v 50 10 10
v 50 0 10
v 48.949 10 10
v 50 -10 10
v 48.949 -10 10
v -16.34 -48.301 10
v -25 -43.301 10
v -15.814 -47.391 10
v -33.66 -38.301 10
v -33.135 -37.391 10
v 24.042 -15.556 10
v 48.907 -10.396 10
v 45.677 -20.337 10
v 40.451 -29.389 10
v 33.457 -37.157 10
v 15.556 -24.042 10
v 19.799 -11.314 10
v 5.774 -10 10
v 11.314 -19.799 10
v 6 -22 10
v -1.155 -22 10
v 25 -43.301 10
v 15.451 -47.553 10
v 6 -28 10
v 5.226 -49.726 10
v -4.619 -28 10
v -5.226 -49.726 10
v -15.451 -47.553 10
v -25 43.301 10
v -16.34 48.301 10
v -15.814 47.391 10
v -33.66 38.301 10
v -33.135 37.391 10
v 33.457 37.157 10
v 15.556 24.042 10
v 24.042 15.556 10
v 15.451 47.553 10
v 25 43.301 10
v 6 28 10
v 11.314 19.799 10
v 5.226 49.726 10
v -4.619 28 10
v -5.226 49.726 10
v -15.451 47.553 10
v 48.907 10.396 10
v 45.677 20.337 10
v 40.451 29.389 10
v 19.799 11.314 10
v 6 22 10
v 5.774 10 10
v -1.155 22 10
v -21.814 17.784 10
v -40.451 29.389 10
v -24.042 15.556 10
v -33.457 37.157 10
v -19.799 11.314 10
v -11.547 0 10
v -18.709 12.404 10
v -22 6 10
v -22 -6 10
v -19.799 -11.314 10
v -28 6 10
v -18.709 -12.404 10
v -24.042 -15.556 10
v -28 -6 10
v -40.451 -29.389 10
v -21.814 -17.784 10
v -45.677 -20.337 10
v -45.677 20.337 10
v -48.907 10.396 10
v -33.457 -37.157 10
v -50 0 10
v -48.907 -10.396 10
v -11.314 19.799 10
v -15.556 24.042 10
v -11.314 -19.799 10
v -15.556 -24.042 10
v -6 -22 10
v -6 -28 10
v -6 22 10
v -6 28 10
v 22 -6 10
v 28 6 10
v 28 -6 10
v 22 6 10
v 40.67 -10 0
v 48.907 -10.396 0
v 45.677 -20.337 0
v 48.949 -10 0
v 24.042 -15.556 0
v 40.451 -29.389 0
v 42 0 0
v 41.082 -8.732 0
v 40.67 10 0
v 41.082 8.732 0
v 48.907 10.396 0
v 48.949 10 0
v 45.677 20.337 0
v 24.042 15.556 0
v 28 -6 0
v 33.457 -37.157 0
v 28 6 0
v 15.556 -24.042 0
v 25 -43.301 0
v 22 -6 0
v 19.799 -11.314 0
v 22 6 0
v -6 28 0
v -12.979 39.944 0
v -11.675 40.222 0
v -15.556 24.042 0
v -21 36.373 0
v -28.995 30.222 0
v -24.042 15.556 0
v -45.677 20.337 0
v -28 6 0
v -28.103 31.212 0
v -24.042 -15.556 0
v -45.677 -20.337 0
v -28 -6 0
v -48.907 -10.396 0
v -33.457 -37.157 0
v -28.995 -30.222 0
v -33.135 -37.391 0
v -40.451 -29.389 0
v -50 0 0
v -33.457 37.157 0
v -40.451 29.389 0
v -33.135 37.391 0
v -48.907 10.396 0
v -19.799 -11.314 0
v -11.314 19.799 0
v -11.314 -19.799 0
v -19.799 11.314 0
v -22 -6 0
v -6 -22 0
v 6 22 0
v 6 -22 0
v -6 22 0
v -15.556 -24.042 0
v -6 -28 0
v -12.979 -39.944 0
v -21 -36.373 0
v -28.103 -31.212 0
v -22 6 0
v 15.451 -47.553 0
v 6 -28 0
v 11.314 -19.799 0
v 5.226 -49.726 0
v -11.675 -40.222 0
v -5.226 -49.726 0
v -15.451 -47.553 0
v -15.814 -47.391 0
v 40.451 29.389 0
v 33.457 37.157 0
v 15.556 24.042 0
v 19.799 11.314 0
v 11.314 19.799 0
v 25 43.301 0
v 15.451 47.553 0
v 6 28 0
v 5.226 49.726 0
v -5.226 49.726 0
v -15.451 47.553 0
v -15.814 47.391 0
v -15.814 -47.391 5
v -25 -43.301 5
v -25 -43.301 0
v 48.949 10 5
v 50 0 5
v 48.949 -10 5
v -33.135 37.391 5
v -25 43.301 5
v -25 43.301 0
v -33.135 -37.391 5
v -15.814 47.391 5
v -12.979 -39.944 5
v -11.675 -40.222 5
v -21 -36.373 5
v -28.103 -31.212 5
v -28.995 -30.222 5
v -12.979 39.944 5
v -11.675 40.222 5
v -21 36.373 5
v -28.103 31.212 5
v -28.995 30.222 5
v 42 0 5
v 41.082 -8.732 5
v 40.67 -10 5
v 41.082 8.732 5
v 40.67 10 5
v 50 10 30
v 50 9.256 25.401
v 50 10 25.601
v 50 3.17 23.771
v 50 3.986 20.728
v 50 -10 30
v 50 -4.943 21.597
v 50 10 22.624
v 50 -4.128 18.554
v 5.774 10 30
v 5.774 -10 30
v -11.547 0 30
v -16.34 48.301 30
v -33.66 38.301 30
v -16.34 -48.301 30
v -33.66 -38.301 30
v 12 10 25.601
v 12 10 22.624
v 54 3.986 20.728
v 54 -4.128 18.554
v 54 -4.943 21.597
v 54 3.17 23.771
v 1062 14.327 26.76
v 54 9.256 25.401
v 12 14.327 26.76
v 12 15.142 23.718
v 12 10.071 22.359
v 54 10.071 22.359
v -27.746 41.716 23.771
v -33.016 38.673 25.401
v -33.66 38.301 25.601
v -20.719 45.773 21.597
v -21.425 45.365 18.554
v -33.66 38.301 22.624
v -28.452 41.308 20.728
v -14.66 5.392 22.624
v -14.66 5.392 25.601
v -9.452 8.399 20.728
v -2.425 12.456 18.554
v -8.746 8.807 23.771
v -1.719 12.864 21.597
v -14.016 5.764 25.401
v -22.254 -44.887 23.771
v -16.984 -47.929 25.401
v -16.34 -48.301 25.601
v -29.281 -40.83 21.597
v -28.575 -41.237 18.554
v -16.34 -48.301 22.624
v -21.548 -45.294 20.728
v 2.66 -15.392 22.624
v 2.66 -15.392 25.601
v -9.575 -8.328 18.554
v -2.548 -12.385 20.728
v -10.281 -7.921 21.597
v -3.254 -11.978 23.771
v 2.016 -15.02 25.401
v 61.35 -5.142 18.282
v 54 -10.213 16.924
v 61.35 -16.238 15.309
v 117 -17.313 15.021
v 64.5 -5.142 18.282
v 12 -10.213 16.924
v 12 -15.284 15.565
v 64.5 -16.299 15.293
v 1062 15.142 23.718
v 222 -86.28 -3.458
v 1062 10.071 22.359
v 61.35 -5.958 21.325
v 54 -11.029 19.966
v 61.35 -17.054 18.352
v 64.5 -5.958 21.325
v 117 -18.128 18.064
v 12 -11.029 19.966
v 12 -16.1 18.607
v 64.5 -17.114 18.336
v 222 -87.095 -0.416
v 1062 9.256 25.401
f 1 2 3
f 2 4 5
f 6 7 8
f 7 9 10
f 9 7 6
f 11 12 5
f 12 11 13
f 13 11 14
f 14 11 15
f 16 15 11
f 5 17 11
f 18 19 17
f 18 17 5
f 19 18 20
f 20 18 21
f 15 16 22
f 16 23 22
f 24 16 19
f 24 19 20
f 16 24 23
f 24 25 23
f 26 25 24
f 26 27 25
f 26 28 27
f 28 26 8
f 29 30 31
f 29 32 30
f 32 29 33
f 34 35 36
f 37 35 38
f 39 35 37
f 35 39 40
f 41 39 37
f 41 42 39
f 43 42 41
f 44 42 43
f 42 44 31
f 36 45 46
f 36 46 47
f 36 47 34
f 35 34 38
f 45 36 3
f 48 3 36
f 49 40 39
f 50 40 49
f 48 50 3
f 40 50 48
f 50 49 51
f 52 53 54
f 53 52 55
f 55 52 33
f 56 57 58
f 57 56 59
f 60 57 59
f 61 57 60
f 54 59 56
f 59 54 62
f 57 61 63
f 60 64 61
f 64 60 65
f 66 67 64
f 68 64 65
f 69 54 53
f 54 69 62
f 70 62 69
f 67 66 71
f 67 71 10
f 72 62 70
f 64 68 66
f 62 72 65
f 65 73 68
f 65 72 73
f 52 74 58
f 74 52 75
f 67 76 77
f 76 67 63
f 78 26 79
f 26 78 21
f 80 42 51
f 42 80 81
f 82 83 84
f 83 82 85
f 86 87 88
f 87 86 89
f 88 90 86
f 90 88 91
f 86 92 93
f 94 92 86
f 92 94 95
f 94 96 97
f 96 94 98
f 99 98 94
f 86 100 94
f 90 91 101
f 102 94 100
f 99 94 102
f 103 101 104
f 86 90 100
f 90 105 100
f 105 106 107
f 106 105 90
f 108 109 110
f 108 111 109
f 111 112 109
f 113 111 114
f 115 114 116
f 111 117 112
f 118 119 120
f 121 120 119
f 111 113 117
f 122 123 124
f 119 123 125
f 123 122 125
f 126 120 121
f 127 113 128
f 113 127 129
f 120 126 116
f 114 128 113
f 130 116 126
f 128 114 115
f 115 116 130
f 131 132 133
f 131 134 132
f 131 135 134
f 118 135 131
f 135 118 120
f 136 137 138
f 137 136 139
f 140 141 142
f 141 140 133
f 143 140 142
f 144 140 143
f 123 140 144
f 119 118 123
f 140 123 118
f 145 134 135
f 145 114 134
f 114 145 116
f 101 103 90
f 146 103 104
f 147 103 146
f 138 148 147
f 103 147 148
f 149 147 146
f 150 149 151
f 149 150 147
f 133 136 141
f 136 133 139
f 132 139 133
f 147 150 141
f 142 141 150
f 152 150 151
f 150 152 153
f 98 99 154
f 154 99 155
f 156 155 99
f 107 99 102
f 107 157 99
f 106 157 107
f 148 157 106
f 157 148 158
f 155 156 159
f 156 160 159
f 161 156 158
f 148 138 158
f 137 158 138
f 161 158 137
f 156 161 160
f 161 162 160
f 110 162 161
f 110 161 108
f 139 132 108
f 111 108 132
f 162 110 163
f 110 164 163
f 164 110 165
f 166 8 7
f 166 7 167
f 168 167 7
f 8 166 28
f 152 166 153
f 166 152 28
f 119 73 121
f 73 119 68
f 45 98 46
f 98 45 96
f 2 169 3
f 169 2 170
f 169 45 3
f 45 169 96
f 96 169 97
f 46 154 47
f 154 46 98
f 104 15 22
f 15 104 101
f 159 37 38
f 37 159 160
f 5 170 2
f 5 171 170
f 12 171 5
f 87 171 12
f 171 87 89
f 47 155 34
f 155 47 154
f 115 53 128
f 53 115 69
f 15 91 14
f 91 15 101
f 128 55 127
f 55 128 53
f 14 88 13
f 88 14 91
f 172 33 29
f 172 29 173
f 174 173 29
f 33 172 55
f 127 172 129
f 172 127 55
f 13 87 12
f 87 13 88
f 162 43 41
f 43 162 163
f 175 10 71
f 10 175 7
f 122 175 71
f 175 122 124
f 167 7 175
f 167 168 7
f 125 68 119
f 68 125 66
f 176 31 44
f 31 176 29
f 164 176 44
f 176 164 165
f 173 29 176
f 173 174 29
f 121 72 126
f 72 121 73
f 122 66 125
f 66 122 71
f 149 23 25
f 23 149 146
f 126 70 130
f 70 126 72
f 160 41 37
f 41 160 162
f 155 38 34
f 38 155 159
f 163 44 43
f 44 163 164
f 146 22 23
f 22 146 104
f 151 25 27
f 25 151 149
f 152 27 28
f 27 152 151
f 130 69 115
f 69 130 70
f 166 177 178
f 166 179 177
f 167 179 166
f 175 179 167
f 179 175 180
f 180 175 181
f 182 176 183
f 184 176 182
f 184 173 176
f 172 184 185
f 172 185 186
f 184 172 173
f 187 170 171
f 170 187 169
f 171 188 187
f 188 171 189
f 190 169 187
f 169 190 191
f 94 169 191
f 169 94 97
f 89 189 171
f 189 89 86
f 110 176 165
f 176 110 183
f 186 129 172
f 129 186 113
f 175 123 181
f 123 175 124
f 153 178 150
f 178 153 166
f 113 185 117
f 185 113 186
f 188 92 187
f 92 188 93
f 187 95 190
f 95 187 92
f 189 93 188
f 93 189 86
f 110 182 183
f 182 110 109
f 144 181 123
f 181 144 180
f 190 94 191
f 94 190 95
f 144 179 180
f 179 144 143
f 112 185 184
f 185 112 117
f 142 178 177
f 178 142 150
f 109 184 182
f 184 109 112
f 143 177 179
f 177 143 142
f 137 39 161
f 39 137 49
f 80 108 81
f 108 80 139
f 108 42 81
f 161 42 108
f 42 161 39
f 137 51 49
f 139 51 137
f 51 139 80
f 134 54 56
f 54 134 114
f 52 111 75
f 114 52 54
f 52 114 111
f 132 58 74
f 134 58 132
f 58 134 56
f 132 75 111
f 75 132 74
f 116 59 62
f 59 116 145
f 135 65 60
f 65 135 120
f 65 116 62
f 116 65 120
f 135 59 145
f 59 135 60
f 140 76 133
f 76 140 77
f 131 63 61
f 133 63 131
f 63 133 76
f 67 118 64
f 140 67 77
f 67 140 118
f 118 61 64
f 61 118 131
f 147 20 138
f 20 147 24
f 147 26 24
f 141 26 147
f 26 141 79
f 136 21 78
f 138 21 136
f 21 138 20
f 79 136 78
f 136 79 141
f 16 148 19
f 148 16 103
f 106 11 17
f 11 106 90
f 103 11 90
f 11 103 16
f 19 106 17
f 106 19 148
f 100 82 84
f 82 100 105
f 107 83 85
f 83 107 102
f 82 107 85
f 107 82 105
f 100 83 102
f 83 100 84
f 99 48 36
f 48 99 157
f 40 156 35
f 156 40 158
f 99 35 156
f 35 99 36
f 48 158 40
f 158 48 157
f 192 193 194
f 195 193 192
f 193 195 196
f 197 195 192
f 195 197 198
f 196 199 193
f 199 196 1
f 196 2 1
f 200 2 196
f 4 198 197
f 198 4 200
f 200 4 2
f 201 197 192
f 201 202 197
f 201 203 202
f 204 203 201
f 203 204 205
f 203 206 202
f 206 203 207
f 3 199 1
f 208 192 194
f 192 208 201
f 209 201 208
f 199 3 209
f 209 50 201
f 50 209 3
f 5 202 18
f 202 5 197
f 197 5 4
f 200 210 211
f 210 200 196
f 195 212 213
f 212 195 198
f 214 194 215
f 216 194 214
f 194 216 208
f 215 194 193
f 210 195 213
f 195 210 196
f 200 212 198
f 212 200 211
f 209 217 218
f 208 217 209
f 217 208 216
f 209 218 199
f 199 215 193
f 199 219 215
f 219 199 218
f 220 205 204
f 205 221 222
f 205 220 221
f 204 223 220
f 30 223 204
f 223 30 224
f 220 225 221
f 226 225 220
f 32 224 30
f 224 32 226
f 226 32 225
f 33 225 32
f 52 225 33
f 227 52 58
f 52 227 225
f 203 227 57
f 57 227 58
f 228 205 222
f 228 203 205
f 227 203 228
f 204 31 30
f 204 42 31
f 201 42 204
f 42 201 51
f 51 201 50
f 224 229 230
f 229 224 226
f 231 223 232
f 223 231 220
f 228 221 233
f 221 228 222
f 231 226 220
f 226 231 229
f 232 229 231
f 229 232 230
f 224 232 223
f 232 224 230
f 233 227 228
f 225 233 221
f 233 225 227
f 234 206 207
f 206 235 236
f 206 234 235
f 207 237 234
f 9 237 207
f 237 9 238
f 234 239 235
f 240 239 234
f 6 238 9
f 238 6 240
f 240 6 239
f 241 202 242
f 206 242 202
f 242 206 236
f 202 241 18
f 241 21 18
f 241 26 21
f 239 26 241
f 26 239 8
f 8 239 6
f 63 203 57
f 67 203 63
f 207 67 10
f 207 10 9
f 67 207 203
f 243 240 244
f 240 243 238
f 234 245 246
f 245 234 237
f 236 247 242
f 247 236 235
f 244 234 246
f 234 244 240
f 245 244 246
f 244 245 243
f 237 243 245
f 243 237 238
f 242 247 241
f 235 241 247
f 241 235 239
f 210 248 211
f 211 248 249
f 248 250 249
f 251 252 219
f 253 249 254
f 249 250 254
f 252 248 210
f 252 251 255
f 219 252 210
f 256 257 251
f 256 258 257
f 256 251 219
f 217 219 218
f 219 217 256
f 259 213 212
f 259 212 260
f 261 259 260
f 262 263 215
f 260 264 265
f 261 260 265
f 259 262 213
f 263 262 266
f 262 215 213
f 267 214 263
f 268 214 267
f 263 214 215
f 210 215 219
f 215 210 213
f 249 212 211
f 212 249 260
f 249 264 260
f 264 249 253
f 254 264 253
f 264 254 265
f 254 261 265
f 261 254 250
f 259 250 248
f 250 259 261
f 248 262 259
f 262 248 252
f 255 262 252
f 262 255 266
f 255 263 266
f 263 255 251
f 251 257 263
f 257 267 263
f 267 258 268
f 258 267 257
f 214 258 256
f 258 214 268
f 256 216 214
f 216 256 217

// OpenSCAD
// file: ../../rotor_peg.scad
/*
 * Copyright (c) 2012 Haydn Vestal
 * 
 * See the file license.txt for copying permission.
 *
 */

include <params.scad>


module rotor_peg_unadjusted() {
  cube([rotor_peg_width, (bearing_ir - rotor_inner_radius) - 5, rotor_peg_height]);
}

module rotor_peg() {
  rotate([0, 90, 0])
  rotor_peg_unadjusted();
}

rotor_peg();
// file: ../../bearing.scad
/*
 * Copyright (c) 2012 Haydn Vestal
 * 
 * See the file license.txt for copying permission.
 * 
 * 
 * DISCLAIMER!
 * THIS IS NOT A PRINTED PART
 * IT IS A PLACEHOLDER FOR A THIRD-PARTY BEARING
 */
include <params.scad>

module bearing() {
  difference() {
    cylinder(h=bearing_height,  r=bearing_or);
    cylinder(h=bearing_height, r=bearing_ir);
  }
}

bearing();
// file: blade.scad
/*
 * Copyright (c) 2012 Haydn Vestal
 * 
 * See the file license.txt for copying permission.
 *
 */

include <wind_params.scad>


module blade() {
  translate([-110, 0, 0])
    linear_extrude(height=blade_thickness) import(file="blade.dxf", layer="0");
}

blade();
// file: ../../rotor_cap.scad
/*
 * Copyright (c) 2012 Haydn Vestal
 * 
 * See the file license.txt for copying permission.
 *
 */


include <params.scad>
use <bearing.scad>
use <rotor_peg.scad>

module subtractor() {
  difference() {
    for (i = [0:stator_count/2]) {
      rotate([0, 0, i * (360 / (stator_count / 2))]) {
        translate([0, blade_holder_edge / -2, 0]) {
          cube([rotor_cap_radius, blade_holder_edge, rotor_plate_height]);
        }
      }
    }
    cylinder(h=rotor_plate_height, r=bearing_or - 1);
  }
  for (i = [0:rotor_count]) {
    rotate([0, 0, i * (360/rotor_count)]) {
      translate([rotor_peg_width/-2, rotor_inner_radius + 2, -rotor_plate_height])
        rotor_peg_unadjusted();
    }
  }
}

module rotor_insert() {
  cylinder(r=rotor_cap_radius, h=rotor_cap_height);
  for (i = [0:rotor_count]) {
    rotate(i * (360 / (rotor_count + 1)), [0, 0, 1])
    translate([0, rotor_cap_peg_radius, 0])
    cylinder(r=peg_radius, h=rotor_cap_insert_height);
  }
}

module blade_holder() {
  translate([0, 0, -blade_holder_edge]) {
    difference() {
      translate([0, blade_holder_edge/-2, 0]) {
        rotate([0, 0, 90]) { cube([blade_holder_edge, rotor_cap_radius, blade_holder_edge]); }
      }
      translate([0, 0, blade_holder_edge/2]) {
        rotate([0, -90, 0]) {
          cylinder(r=hole_radius, h=rotor_cap_radius + 10);
        }
      }
    }
  }
}

module rotor_cap_full() {
  difference() {
    union() {
      rotor_insert();
      for (i = [0:stator_count/2]) {
        rotate([0, 0, i * (360 / (stator_count/2))]) { blade_holder(); }
      }
    }
    translate([0, 0, rotor_cap_height - rotor_plate_height]) {
      subtractor();
    }
  }
}

module rotor_cap() {
  rotate([0, 180, 0]) {
    difference() {
      rotor_cap_full();
      translate([0, 0, -50]) { cylinder(h=100, r=rotor_cap_inner_radius); }
    }
  }
}

rotor_cap();
// file: wind_params.scad
/*
 * Copyright (c) 2012 Haydn Vestal
 * 
 * See the file license.txt for copying permission.
 *
 */


// FRAME
frame_thickness = 10;

// BLADE
blade_thickness = 3;
blade_count = 3;

// BEARING
bearing_ir = 35;
bearing_or = 55;
bearing_height = 25;

// POLE CAP
pole_radius = 12.7;
pole_cap_height = 80;
swivel_ir = 22.5;
swivel_or = 32.5;
// file: ../../params.scad
/*
 * Copyright (c) 2012 Haydn Vestal
 * 
 * See the file license.txt for copying permission.
 * 
 */

// GLOBAL
hole_radius = 5;
peg_radius = 4.5;

// MAGNET
mag_height = 6.4;
mag_ring_ir = 50;
mag_ring_or = 102;
mag_count = 16;

// BEARING
bearing_height = 25;
bearing_ir = 31;
bearing_or = 43;

// STATOR
stator_height = 16;
stator_inner_height = stator_height/2;
stator_count = 6;
stator_incidence = 360/stator_count;
stator_radius = 115;
stator_tab_width = 10;
stator_tab_offset = 50;
stator_wiring_gap = 25;
stator_wiring_gap_inset = stator_radius - (stator_wiring_gap + 10);
stator_outer_tab_extrude = 15;
stator_outer_tab_width = 30;
stator_notch = 15;
stator_notch_width = 5;
coil_edge = 80;
coil_block_length = 70;

// ROTOR & ROTOR CAP
rotor_height = mag_height + 2;
rotor_inner_height = 3;
rotor_radius = 105;
rotor_inner_radius = 20;
rotor_count = 8;
rotor_incidence = 360/rotor_count;
rotor_tie_hole_offset = 30;

rotor_cap_radius = 50;
rotor_cap_peg_radius = 35;
rotor_cap_inner_radius = 10;
rotor_cap_height = 10;
rotor_cap_insert_height = 10;
rotor_cap_bearing_inset = (bearing_height + rotor_inner_height) - rotor_cap_height;
rotor_plate_height = 5;
blade_holder_edge = 20;
rotor_peg_width = 12;
rotor_peg_height = (rotor_height * 2) + (rotor_cap_height * 2) + stator_height;

// ROTOR EDGE TIE
rotor_edge_tie_length = 40;
rotor_edge_tie_width = 20;
rotor_edge_tie_inner_height = 5;
rotor_edge_tie_height = rotor_height + rotor_plate_height;
rotor_edge_tie_peg_inset = 10;
// main file
/*
 * Copyright (c) 2012 Haydn Vestal
 * 
 * See the file license.txt for copying permission.
 *
 */

include <../../params.scad>
include <wind_params.scad>
use <../../rotor_cap.scad>
use <blade.scad>


module blade_holder() {
  difference() {
    translate([0, blade_holder_edge/-2, rotor_cap_height]) {
      cube([rotor_cap_radius, blade_holder_edge, blade_holder_edge]);
    }
    translate([12, 5, rotor_cap_height + (blade_holder_edge/2) + 1]) {
      rotate([0, 15, -90]) {
        scale([1.05, 1.05, 1.05]) blade();
      }
    }
  }
}

module rotor_cap() {
  difference() {
    rotor_insert();
    subtractor();
  }
  for (i = [0:blade_count]) {
    rotate([0, 0, i * (360/blade_count)]) blade_holder();
  }
}

rotor_cap();
translate([12, 5, rotor_cap_height + (blade_holder_edge/2) + 1]) {
      rotate([0, 15, -90]) {
        scale([1.05, 1.05, 1.05]) blade();
      }
    }
